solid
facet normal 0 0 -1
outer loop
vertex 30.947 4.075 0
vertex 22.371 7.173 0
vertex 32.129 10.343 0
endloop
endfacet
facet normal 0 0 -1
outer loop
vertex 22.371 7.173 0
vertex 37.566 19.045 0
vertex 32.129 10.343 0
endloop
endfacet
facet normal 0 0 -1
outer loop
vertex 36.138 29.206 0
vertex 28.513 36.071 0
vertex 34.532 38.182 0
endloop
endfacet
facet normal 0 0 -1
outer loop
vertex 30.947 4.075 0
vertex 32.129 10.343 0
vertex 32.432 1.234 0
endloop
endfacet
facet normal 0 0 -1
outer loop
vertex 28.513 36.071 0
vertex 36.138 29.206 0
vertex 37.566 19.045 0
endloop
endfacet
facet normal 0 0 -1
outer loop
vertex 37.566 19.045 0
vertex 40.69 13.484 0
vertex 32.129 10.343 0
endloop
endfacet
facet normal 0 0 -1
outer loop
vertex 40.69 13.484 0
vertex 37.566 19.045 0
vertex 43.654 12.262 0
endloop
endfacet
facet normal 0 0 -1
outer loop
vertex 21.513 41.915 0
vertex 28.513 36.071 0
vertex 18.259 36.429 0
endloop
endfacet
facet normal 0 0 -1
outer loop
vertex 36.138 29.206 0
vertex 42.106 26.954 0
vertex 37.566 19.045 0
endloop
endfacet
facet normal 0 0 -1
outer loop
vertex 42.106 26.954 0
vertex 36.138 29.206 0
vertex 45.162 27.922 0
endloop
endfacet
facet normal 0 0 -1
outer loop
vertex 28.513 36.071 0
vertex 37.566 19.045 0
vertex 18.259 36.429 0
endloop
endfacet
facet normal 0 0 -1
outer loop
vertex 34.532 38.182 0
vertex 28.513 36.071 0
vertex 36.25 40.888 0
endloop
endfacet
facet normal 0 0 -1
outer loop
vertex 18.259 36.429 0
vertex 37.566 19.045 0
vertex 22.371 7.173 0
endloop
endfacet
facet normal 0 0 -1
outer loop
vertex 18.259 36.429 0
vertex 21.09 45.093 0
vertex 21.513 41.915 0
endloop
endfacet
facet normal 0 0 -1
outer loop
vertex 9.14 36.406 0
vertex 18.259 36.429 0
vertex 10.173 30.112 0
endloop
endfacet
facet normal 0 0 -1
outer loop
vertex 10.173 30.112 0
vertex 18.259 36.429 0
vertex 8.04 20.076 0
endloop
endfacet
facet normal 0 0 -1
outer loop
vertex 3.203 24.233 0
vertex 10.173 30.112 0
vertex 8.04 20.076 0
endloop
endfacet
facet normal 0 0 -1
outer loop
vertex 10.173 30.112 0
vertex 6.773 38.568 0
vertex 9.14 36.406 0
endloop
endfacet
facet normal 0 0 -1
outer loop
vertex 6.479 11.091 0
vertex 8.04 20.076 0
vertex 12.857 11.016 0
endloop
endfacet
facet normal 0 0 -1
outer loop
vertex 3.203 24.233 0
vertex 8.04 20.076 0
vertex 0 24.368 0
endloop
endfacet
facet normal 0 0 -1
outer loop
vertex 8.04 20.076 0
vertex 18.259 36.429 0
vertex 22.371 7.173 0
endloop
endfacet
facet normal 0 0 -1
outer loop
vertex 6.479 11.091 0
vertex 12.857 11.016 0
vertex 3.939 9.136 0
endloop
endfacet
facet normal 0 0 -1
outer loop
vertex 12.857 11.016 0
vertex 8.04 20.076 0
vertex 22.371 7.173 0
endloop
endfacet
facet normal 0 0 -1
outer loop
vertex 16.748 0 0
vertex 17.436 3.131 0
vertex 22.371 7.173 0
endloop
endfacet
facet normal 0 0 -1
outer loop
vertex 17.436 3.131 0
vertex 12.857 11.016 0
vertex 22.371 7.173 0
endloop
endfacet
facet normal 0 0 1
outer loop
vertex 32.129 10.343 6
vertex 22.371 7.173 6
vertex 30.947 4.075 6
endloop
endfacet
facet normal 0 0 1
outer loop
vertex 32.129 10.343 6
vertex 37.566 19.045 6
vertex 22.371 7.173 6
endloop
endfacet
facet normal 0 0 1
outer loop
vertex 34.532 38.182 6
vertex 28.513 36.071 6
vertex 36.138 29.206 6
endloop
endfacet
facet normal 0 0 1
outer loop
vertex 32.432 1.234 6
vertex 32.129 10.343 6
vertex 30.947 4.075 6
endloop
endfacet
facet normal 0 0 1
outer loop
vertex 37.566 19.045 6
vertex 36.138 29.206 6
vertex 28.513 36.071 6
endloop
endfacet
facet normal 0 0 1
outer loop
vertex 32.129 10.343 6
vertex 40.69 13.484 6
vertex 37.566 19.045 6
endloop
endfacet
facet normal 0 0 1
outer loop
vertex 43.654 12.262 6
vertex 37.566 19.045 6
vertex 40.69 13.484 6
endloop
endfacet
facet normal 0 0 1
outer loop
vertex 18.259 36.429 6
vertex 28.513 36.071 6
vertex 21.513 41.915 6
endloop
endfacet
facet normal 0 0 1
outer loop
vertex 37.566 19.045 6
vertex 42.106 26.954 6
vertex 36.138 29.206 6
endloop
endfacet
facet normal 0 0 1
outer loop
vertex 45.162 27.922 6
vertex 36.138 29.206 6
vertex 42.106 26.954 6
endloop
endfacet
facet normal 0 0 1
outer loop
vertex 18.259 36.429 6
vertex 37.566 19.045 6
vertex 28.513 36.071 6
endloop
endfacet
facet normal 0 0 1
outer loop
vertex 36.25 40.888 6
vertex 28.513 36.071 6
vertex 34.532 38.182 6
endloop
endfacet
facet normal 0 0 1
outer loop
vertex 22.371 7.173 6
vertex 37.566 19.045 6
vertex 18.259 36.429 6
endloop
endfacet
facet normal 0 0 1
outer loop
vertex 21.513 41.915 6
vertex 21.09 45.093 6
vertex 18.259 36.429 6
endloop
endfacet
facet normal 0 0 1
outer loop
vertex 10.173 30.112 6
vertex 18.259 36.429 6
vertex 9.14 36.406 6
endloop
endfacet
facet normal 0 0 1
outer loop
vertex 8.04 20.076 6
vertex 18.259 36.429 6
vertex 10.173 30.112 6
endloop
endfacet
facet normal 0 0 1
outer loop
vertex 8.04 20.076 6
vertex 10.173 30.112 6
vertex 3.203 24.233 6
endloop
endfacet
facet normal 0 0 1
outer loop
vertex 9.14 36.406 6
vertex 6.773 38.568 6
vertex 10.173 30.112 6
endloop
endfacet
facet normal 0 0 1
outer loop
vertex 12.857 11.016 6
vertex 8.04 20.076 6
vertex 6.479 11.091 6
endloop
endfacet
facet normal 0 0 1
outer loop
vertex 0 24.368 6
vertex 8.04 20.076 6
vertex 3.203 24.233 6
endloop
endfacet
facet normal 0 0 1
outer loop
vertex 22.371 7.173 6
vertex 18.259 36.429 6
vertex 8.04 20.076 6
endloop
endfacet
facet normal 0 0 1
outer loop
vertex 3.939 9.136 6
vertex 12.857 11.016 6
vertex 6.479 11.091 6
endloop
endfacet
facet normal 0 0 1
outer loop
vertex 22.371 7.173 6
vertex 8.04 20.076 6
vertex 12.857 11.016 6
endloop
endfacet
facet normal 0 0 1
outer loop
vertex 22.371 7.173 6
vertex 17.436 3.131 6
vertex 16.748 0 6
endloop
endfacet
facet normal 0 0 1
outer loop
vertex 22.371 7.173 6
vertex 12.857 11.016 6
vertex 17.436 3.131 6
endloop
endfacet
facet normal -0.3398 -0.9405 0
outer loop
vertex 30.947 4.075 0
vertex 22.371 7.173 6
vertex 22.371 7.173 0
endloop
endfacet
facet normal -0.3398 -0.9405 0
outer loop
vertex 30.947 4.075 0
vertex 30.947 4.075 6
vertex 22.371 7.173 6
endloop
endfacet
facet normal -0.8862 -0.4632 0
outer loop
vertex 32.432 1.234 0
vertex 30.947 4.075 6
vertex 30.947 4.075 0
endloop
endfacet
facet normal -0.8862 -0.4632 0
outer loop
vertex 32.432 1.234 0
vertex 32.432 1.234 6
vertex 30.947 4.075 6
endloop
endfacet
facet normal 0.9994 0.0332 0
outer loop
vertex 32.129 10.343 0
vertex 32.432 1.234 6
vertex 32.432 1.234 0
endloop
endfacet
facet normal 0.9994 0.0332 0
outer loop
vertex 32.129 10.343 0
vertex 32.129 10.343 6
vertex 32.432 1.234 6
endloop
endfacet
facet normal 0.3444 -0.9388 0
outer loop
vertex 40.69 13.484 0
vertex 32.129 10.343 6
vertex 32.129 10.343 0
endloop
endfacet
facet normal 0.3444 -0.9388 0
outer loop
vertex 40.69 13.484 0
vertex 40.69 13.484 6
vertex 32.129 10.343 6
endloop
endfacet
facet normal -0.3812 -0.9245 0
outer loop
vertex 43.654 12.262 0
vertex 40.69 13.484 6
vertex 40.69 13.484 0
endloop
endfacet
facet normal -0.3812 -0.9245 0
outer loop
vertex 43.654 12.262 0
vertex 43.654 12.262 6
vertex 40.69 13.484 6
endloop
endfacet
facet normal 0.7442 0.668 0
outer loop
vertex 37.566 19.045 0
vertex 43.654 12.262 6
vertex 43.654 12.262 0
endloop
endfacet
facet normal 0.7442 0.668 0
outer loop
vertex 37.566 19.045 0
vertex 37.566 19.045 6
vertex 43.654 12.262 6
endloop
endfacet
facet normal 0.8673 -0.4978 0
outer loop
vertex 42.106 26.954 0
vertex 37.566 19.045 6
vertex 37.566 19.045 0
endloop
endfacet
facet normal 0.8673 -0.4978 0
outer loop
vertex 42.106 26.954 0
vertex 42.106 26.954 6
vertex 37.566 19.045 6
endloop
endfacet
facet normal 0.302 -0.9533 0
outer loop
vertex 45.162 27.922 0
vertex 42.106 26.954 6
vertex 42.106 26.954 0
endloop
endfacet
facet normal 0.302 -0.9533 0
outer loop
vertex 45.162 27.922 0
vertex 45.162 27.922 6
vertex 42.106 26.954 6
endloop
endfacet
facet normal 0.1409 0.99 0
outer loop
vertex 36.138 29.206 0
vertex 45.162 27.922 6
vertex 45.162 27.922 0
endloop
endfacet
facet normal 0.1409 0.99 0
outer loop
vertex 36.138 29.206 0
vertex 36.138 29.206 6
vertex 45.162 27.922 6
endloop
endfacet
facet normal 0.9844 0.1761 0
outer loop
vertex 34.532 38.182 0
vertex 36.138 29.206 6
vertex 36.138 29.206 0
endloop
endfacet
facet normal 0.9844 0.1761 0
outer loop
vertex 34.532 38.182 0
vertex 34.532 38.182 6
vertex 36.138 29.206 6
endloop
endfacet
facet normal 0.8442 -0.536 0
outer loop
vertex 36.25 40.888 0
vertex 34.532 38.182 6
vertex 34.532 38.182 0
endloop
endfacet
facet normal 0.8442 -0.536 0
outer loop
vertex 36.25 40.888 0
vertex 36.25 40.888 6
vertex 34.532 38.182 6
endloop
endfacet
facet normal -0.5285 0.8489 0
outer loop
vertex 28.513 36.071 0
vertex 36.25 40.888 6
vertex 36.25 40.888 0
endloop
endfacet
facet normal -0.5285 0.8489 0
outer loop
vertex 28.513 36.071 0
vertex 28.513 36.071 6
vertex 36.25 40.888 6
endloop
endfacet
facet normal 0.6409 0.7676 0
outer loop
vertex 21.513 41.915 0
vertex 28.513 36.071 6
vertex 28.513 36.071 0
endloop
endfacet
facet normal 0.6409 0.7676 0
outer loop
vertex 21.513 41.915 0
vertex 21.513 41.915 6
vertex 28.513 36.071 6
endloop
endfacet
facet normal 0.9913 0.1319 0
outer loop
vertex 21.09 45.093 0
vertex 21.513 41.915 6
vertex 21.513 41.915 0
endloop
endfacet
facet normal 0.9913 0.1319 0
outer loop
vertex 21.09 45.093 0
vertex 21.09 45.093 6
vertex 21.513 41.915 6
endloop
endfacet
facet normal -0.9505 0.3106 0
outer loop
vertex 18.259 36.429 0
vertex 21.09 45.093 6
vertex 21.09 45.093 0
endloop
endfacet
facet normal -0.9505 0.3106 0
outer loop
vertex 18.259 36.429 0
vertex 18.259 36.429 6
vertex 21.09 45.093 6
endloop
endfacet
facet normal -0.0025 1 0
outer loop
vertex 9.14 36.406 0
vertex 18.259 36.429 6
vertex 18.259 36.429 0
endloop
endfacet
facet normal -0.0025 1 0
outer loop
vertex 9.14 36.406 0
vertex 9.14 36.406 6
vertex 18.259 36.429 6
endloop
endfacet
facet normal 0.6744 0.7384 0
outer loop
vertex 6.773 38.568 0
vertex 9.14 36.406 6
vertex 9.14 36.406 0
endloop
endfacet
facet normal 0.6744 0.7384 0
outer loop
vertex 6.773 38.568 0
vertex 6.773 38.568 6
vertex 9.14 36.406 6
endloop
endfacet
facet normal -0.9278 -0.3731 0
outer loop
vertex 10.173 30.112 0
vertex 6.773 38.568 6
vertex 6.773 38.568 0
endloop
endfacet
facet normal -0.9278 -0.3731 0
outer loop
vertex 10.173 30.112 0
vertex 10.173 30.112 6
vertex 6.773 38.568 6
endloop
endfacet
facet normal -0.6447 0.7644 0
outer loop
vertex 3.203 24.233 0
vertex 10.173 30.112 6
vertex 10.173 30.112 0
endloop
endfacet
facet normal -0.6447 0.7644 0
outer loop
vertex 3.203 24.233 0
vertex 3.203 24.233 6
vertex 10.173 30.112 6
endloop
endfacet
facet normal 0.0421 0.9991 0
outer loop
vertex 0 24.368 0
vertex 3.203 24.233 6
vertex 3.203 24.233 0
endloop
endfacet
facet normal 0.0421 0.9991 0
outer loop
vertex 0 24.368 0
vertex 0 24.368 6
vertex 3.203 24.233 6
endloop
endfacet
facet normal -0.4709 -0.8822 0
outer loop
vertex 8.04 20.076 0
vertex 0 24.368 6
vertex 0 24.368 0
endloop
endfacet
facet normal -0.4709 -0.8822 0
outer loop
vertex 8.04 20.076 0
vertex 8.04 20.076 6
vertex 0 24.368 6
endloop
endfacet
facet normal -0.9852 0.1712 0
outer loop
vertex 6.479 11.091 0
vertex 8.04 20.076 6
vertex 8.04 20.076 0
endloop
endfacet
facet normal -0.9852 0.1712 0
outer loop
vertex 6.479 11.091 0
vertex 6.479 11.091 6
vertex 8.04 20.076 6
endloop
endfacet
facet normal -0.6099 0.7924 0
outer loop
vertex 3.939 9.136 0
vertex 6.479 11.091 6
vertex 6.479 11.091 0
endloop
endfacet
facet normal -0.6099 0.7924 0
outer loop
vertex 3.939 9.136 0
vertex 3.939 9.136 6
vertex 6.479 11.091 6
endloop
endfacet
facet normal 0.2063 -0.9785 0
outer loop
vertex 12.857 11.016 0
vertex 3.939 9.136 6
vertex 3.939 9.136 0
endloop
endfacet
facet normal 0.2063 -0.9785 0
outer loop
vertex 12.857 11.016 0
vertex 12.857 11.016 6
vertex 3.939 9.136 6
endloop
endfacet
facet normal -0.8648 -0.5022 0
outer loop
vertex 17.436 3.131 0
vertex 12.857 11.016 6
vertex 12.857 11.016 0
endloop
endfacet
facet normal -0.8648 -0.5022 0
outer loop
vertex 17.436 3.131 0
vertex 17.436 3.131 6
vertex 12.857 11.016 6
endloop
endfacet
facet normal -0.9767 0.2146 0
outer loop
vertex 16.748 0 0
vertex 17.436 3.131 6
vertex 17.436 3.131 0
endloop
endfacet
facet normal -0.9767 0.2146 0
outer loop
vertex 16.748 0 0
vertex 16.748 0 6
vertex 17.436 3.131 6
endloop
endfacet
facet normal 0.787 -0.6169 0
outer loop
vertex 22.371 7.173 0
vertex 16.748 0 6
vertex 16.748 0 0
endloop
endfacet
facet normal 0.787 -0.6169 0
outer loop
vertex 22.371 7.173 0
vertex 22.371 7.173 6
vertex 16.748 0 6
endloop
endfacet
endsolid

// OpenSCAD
$fn = 32;

// ----------------------------------------------------------------------
// Fan rotor section: 9 blades, 15 mm hub radius, 8 mm blades
// ----------------------------------------------------------------------

// --- parameters (mm) ---
profile_height = 6;       // extrusion height
profile_points = 27;      // points of the closed outline

profile = [[37.566, 19.045], [42.106, 26.954], [45.162, 27.922], [36.138, 29.206], [34.532, 38.182], [36.25, 40.888], [28.513, 36.071], [21.513, 41.915], [21.09, 45.093], [18.259, 36.429], [9.14, 36.406], [6.773, 38.568], [10.173, 30.112], [3.203, 24.233], [0, 24.368], [8.04, 20.076], [6.479, 11.091], [3.939, 9.136], [12.857, 11.016], [17.436, 3.131], [16.748, 0], [22.371, 7.173], [30.947, 4.075], [32.432, 1.234], [32.129, 10.343], [40.69, 13.484], [43.654, 12.262]];  // single closed polygon, 27 points, counter clockwise

// --- the one profile operation ---
linear_extrude(height = profile_height) polygon(points = profile);
